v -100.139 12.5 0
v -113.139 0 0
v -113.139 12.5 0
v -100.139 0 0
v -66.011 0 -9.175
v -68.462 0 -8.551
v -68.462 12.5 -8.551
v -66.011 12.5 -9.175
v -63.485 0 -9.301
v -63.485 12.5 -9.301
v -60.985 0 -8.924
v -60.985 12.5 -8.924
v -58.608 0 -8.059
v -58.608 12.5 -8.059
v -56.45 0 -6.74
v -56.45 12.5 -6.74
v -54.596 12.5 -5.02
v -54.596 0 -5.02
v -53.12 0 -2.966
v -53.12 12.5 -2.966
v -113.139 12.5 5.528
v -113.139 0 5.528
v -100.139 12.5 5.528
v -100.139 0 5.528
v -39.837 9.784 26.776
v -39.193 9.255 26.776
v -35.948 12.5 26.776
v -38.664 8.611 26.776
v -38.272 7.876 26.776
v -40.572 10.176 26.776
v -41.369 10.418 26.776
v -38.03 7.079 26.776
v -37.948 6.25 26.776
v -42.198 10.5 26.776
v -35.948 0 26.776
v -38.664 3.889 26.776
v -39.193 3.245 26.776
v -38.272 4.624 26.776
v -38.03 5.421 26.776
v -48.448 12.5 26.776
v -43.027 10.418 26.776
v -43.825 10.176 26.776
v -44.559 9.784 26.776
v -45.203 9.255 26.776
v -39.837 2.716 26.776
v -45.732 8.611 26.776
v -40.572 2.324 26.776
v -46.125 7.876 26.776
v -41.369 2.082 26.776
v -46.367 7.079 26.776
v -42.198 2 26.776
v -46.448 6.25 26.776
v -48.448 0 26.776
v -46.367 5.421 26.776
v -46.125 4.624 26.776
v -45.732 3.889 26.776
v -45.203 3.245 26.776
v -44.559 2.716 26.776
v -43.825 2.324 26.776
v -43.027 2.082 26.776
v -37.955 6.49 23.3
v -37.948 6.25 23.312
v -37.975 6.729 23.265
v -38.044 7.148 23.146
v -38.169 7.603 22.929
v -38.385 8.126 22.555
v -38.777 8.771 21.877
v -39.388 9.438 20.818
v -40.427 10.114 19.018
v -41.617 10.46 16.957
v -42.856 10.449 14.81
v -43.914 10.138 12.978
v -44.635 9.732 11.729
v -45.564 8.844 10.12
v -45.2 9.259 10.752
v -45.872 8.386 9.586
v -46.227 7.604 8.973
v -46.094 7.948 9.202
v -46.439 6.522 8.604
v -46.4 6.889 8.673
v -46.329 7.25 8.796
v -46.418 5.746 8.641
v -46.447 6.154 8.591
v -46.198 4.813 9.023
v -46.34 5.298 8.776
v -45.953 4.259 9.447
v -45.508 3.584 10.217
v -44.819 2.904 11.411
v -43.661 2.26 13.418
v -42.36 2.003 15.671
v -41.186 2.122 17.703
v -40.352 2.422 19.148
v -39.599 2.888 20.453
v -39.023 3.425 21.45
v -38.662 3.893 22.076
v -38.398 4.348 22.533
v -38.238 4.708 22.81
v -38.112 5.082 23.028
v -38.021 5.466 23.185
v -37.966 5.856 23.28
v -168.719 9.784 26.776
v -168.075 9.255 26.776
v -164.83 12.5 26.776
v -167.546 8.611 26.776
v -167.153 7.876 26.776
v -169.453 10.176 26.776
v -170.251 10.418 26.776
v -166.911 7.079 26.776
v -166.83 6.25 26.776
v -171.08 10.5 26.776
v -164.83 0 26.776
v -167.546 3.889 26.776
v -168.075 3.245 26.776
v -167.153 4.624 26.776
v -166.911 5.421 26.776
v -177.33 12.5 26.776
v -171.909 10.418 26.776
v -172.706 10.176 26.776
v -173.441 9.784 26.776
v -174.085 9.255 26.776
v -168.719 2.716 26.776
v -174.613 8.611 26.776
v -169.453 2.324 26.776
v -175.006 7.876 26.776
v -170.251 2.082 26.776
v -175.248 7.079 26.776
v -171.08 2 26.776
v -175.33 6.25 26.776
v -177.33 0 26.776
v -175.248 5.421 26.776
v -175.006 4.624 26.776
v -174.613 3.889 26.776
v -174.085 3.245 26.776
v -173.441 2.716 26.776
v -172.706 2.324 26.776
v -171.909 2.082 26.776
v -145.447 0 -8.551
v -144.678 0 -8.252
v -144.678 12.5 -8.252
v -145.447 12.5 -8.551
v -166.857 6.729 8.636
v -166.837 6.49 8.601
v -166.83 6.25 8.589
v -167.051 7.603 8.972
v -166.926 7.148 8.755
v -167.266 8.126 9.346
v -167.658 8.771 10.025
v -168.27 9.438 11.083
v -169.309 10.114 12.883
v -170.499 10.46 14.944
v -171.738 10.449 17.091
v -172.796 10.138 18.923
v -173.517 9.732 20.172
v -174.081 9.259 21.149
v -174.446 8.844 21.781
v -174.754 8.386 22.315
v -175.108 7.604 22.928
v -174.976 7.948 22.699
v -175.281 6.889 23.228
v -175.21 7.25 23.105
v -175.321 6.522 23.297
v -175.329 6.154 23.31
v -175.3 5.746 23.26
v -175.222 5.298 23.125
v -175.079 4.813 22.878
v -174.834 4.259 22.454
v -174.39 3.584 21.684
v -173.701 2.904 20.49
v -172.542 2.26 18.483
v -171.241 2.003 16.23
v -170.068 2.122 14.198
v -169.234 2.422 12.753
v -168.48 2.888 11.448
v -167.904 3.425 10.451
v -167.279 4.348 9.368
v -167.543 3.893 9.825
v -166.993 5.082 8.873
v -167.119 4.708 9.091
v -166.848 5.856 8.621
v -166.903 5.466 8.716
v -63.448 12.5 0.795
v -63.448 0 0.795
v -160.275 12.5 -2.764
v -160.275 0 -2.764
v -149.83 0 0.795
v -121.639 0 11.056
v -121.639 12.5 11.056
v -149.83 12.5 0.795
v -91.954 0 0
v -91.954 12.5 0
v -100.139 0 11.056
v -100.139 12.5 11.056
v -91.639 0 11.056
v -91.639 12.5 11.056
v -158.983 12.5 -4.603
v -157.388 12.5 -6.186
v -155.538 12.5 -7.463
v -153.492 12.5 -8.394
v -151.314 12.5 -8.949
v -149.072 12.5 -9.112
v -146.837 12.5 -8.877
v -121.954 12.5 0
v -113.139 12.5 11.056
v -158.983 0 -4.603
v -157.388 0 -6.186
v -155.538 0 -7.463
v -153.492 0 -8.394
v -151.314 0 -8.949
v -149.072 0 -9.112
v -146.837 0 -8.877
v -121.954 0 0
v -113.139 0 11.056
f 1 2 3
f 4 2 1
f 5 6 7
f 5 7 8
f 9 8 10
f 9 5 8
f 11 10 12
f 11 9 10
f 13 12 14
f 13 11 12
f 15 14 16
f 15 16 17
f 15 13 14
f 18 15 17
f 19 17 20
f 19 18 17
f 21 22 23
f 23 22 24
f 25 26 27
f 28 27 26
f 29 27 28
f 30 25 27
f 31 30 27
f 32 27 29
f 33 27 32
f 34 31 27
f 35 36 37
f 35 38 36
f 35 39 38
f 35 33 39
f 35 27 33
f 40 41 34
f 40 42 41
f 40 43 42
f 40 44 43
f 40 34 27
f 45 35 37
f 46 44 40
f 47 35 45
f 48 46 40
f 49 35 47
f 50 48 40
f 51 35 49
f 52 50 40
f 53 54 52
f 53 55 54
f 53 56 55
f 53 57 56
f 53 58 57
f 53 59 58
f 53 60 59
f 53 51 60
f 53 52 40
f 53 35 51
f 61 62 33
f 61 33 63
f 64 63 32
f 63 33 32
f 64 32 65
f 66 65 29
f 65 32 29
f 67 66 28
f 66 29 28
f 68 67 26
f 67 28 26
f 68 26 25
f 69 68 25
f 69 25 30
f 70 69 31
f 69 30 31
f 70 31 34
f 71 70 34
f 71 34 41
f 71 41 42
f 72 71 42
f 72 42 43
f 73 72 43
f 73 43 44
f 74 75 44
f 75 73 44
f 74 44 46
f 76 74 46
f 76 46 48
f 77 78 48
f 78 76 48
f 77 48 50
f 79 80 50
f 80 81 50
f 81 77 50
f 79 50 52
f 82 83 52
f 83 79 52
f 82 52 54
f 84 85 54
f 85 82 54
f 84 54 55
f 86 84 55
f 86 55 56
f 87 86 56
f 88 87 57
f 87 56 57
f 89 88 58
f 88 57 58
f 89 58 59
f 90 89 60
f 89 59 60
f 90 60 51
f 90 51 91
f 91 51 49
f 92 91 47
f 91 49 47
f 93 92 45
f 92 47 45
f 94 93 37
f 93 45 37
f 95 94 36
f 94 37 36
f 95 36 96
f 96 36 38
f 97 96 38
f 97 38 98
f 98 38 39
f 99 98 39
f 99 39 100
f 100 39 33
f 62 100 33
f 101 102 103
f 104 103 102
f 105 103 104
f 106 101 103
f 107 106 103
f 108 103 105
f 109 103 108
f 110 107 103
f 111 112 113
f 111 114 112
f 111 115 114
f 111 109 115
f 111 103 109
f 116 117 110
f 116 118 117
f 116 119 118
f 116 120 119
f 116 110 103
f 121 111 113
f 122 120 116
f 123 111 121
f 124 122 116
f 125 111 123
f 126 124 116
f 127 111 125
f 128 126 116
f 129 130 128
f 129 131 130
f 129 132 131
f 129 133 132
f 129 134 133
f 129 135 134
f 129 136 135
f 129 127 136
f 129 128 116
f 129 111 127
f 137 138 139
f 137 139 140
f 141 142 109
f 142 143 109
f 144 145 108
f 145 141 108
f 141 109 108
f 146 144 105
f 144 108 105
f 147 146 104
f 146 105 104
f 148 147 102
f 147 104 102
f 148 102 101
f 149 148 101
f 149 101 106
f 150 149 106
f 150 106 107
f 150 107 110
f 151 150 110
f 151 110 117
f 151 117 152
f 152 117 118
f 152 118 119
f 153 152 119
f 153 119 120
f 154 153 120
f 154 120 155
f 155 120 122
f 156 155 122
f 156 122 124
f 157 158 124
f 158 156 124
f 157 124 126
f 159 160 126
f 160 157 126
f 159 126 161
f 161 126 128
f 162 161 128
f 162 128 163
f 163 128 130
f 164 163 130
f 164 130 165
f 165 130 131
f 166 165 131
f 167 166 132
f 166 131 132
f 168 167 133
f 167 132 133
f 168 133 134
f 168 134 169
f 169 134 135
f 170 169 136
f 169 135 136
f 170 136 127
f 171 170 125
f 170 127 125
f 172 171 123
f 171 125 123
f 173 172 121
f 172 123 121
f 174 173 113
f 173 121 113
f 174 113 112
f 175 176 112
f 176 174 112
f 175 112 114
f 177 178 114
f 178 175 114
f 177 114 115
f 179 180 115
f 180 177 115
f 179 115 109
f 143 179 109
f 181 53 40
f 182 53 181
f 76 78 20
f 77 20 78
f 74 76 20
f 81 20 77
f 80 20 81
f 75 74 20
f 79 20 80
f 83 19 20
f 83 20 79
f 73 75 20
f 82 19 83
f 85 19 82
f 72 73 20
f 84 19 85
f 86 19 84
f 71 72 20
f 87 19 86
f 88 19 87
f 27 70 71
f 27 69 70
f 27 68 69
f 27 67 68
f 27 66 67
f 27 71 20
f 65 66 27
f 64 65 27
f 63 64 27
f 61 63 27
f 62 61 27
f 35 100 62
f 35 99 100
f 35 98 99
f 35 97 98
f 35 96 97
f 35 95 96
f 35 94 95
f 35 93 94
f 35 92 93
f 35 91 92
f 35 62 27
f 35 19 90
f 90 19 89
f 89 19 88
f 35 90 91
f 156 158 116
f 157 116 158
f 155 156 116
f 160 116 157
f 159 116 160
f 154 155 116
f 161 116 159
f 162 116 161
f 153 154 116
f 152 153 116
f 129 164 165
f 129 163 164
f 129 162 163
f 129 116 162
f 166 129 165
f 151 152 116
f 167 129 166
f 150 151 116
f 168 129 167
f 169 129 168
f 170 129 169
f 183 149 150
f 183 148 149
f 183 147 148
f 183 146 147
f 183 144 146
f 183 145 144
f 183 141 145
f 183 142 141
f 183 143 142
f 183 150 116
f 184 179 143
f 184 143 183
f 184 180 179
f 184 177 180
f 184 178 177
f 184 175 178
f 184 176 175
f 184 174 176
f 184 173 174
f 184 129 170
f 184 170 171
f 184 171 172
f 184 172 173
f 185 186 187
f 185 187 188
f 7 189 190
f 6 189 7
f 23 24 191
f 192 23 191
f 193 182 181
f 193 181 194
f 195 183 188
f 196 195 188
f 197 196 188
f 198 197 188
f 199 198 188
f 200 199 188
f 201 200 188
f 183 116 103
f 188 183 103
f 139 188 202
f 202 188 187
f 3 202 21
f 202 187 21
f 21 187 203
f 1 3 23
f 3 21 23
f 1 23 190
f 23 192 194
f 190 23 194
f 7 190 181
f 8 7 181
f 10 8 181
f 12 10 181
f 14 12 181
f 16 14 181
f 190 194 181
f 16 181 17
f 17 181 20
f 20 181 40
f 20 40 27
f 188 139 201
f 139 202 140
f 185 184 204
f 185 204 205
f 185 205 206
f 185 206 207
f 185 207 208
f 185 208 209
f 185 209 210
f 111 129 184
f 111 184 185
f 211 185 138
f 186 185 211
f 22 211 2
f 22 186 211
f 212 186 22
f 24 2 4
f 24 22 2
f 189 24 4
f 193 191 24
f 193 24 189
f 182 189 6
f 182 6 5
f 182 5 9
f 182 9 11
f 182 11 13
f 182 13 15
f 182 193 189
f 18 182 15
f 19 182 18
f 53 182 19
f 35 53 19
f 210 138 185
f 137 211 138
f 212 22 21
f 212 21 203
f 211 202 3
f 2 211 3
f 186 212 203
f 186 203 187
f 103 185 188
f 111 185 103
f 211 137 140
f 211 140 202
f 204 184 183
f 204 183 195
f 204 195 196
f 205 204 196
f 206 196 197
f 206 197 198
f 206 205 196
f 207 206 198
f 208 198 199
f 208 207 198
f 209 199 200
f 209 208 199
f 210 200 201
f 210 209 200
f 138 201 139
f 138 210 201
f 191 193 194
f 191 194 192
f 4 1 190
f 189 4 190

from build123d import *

# Parameters (mm, degrees)
F0_W     = 13
F0_H     = 5.527861
F1_DEPTH = 12.5
F3_R     = 4.25
F4_DEPTH = 33.782
F2_R     = 4.25
F5_DEPTH = 25.4
F6_DEPTH = 25.4


with BuildPart() as f1:
    # F0 (on Front) → F1 (new body)
    with BuildSketch(Plane.XZ):
        with BuildLine():
            Line((-113.13897, 5.527861), (-113.13897, 11.055722))
            Line((-113.13897, 11.055722), (-121.63897, 11.055722))
            Line((-121.63897, 11.055722), (-149.829749, 0.795117))
            Line((-149.829749, 0.795117), (-164.829749, 26.77588))
            Line((-164.829749, 26.77588), (-177.329749, 26.77588))
            Line((-177.329749, 26.77588), (-160.275072, -2.763686))
            ThreePointArc((-160.275072, -2.763686), (-153.492043, -8.393653), (-144.678081, -8.251933))
            Line((-144.678081, -8.251933), (-145.446718, -8.550504))
            Line((-145.446718, -8.550504), (-121.954403, 0))
            Line((-121.954403, 0), (-113.13897, 0))
            Line((-113.13897, 0), (-113.13897, 5.527861))
        make_face()
        with Locations((-106.63897, 8.291791)):
            Rectangle(F0_W, F0_H)
        with Locations((-106.63897, 2.76393)):
            Rectangle(F0_W, F0_H)
        with BuildLine():
            Line((-53.119909, -2.966407), (-35.948191, 26.77588))
            Line((-35.948191, 26.77588), (-48.448191, 26.77588))
            Line((-48.448191, 26.77588), (-63.448191, 0.795117))
            Line((-63.448191, 0.795117), (-91.63897, 11.055722))
            Line((-91.63897, 11.055722), (-100.13897, 11.055722))
            Line((-100.13897, 11.055722), (-100.13897, 5.527861))
            Line((-100.13897, 5.527861), (-100.13897, 0))
            Line((-100.13897, 0), (-91.954403, 0))
            Line((-91.954403, 0), (-68.462087, -8.550504))
            ThreePointArc((-68.462087, -8.550504), (-59.774775, -8.550504), (-53.119909, -2.966407))
        make_face()
    extrude(amount=-F1_DEPTH)

    # F3 (on face) → F4 (cut)
    with BuildSketch(Plane.XY.offset(26.77588)):
        with Locations((-171.079749, 6.25)):
            Circle(F3_R)
    extrude(amount=-F4_DEPTH, mode=Mode.SUBTRACT)

    # F2 (on face) → F5 (cut)
    with BuildSketch(Plane.XY.offset(26.77588)):
        with Locations((-42.198191, 6.25)):
            Circle(F2_R)
    extrude(amount=-F5_DEPTH, mode=Mode.SUBTRACT)

    # F0 (on Front) → F6 (cut)
    with BuildSketch(Plane.XZ):
        with Locations((-106.63897, 8.291791)):
            Rectangle(F0_W, F0_H)
    extrude(amount=-F6_DEPTH, mode=Mode.SUBTRACT)


solid = f1.part
